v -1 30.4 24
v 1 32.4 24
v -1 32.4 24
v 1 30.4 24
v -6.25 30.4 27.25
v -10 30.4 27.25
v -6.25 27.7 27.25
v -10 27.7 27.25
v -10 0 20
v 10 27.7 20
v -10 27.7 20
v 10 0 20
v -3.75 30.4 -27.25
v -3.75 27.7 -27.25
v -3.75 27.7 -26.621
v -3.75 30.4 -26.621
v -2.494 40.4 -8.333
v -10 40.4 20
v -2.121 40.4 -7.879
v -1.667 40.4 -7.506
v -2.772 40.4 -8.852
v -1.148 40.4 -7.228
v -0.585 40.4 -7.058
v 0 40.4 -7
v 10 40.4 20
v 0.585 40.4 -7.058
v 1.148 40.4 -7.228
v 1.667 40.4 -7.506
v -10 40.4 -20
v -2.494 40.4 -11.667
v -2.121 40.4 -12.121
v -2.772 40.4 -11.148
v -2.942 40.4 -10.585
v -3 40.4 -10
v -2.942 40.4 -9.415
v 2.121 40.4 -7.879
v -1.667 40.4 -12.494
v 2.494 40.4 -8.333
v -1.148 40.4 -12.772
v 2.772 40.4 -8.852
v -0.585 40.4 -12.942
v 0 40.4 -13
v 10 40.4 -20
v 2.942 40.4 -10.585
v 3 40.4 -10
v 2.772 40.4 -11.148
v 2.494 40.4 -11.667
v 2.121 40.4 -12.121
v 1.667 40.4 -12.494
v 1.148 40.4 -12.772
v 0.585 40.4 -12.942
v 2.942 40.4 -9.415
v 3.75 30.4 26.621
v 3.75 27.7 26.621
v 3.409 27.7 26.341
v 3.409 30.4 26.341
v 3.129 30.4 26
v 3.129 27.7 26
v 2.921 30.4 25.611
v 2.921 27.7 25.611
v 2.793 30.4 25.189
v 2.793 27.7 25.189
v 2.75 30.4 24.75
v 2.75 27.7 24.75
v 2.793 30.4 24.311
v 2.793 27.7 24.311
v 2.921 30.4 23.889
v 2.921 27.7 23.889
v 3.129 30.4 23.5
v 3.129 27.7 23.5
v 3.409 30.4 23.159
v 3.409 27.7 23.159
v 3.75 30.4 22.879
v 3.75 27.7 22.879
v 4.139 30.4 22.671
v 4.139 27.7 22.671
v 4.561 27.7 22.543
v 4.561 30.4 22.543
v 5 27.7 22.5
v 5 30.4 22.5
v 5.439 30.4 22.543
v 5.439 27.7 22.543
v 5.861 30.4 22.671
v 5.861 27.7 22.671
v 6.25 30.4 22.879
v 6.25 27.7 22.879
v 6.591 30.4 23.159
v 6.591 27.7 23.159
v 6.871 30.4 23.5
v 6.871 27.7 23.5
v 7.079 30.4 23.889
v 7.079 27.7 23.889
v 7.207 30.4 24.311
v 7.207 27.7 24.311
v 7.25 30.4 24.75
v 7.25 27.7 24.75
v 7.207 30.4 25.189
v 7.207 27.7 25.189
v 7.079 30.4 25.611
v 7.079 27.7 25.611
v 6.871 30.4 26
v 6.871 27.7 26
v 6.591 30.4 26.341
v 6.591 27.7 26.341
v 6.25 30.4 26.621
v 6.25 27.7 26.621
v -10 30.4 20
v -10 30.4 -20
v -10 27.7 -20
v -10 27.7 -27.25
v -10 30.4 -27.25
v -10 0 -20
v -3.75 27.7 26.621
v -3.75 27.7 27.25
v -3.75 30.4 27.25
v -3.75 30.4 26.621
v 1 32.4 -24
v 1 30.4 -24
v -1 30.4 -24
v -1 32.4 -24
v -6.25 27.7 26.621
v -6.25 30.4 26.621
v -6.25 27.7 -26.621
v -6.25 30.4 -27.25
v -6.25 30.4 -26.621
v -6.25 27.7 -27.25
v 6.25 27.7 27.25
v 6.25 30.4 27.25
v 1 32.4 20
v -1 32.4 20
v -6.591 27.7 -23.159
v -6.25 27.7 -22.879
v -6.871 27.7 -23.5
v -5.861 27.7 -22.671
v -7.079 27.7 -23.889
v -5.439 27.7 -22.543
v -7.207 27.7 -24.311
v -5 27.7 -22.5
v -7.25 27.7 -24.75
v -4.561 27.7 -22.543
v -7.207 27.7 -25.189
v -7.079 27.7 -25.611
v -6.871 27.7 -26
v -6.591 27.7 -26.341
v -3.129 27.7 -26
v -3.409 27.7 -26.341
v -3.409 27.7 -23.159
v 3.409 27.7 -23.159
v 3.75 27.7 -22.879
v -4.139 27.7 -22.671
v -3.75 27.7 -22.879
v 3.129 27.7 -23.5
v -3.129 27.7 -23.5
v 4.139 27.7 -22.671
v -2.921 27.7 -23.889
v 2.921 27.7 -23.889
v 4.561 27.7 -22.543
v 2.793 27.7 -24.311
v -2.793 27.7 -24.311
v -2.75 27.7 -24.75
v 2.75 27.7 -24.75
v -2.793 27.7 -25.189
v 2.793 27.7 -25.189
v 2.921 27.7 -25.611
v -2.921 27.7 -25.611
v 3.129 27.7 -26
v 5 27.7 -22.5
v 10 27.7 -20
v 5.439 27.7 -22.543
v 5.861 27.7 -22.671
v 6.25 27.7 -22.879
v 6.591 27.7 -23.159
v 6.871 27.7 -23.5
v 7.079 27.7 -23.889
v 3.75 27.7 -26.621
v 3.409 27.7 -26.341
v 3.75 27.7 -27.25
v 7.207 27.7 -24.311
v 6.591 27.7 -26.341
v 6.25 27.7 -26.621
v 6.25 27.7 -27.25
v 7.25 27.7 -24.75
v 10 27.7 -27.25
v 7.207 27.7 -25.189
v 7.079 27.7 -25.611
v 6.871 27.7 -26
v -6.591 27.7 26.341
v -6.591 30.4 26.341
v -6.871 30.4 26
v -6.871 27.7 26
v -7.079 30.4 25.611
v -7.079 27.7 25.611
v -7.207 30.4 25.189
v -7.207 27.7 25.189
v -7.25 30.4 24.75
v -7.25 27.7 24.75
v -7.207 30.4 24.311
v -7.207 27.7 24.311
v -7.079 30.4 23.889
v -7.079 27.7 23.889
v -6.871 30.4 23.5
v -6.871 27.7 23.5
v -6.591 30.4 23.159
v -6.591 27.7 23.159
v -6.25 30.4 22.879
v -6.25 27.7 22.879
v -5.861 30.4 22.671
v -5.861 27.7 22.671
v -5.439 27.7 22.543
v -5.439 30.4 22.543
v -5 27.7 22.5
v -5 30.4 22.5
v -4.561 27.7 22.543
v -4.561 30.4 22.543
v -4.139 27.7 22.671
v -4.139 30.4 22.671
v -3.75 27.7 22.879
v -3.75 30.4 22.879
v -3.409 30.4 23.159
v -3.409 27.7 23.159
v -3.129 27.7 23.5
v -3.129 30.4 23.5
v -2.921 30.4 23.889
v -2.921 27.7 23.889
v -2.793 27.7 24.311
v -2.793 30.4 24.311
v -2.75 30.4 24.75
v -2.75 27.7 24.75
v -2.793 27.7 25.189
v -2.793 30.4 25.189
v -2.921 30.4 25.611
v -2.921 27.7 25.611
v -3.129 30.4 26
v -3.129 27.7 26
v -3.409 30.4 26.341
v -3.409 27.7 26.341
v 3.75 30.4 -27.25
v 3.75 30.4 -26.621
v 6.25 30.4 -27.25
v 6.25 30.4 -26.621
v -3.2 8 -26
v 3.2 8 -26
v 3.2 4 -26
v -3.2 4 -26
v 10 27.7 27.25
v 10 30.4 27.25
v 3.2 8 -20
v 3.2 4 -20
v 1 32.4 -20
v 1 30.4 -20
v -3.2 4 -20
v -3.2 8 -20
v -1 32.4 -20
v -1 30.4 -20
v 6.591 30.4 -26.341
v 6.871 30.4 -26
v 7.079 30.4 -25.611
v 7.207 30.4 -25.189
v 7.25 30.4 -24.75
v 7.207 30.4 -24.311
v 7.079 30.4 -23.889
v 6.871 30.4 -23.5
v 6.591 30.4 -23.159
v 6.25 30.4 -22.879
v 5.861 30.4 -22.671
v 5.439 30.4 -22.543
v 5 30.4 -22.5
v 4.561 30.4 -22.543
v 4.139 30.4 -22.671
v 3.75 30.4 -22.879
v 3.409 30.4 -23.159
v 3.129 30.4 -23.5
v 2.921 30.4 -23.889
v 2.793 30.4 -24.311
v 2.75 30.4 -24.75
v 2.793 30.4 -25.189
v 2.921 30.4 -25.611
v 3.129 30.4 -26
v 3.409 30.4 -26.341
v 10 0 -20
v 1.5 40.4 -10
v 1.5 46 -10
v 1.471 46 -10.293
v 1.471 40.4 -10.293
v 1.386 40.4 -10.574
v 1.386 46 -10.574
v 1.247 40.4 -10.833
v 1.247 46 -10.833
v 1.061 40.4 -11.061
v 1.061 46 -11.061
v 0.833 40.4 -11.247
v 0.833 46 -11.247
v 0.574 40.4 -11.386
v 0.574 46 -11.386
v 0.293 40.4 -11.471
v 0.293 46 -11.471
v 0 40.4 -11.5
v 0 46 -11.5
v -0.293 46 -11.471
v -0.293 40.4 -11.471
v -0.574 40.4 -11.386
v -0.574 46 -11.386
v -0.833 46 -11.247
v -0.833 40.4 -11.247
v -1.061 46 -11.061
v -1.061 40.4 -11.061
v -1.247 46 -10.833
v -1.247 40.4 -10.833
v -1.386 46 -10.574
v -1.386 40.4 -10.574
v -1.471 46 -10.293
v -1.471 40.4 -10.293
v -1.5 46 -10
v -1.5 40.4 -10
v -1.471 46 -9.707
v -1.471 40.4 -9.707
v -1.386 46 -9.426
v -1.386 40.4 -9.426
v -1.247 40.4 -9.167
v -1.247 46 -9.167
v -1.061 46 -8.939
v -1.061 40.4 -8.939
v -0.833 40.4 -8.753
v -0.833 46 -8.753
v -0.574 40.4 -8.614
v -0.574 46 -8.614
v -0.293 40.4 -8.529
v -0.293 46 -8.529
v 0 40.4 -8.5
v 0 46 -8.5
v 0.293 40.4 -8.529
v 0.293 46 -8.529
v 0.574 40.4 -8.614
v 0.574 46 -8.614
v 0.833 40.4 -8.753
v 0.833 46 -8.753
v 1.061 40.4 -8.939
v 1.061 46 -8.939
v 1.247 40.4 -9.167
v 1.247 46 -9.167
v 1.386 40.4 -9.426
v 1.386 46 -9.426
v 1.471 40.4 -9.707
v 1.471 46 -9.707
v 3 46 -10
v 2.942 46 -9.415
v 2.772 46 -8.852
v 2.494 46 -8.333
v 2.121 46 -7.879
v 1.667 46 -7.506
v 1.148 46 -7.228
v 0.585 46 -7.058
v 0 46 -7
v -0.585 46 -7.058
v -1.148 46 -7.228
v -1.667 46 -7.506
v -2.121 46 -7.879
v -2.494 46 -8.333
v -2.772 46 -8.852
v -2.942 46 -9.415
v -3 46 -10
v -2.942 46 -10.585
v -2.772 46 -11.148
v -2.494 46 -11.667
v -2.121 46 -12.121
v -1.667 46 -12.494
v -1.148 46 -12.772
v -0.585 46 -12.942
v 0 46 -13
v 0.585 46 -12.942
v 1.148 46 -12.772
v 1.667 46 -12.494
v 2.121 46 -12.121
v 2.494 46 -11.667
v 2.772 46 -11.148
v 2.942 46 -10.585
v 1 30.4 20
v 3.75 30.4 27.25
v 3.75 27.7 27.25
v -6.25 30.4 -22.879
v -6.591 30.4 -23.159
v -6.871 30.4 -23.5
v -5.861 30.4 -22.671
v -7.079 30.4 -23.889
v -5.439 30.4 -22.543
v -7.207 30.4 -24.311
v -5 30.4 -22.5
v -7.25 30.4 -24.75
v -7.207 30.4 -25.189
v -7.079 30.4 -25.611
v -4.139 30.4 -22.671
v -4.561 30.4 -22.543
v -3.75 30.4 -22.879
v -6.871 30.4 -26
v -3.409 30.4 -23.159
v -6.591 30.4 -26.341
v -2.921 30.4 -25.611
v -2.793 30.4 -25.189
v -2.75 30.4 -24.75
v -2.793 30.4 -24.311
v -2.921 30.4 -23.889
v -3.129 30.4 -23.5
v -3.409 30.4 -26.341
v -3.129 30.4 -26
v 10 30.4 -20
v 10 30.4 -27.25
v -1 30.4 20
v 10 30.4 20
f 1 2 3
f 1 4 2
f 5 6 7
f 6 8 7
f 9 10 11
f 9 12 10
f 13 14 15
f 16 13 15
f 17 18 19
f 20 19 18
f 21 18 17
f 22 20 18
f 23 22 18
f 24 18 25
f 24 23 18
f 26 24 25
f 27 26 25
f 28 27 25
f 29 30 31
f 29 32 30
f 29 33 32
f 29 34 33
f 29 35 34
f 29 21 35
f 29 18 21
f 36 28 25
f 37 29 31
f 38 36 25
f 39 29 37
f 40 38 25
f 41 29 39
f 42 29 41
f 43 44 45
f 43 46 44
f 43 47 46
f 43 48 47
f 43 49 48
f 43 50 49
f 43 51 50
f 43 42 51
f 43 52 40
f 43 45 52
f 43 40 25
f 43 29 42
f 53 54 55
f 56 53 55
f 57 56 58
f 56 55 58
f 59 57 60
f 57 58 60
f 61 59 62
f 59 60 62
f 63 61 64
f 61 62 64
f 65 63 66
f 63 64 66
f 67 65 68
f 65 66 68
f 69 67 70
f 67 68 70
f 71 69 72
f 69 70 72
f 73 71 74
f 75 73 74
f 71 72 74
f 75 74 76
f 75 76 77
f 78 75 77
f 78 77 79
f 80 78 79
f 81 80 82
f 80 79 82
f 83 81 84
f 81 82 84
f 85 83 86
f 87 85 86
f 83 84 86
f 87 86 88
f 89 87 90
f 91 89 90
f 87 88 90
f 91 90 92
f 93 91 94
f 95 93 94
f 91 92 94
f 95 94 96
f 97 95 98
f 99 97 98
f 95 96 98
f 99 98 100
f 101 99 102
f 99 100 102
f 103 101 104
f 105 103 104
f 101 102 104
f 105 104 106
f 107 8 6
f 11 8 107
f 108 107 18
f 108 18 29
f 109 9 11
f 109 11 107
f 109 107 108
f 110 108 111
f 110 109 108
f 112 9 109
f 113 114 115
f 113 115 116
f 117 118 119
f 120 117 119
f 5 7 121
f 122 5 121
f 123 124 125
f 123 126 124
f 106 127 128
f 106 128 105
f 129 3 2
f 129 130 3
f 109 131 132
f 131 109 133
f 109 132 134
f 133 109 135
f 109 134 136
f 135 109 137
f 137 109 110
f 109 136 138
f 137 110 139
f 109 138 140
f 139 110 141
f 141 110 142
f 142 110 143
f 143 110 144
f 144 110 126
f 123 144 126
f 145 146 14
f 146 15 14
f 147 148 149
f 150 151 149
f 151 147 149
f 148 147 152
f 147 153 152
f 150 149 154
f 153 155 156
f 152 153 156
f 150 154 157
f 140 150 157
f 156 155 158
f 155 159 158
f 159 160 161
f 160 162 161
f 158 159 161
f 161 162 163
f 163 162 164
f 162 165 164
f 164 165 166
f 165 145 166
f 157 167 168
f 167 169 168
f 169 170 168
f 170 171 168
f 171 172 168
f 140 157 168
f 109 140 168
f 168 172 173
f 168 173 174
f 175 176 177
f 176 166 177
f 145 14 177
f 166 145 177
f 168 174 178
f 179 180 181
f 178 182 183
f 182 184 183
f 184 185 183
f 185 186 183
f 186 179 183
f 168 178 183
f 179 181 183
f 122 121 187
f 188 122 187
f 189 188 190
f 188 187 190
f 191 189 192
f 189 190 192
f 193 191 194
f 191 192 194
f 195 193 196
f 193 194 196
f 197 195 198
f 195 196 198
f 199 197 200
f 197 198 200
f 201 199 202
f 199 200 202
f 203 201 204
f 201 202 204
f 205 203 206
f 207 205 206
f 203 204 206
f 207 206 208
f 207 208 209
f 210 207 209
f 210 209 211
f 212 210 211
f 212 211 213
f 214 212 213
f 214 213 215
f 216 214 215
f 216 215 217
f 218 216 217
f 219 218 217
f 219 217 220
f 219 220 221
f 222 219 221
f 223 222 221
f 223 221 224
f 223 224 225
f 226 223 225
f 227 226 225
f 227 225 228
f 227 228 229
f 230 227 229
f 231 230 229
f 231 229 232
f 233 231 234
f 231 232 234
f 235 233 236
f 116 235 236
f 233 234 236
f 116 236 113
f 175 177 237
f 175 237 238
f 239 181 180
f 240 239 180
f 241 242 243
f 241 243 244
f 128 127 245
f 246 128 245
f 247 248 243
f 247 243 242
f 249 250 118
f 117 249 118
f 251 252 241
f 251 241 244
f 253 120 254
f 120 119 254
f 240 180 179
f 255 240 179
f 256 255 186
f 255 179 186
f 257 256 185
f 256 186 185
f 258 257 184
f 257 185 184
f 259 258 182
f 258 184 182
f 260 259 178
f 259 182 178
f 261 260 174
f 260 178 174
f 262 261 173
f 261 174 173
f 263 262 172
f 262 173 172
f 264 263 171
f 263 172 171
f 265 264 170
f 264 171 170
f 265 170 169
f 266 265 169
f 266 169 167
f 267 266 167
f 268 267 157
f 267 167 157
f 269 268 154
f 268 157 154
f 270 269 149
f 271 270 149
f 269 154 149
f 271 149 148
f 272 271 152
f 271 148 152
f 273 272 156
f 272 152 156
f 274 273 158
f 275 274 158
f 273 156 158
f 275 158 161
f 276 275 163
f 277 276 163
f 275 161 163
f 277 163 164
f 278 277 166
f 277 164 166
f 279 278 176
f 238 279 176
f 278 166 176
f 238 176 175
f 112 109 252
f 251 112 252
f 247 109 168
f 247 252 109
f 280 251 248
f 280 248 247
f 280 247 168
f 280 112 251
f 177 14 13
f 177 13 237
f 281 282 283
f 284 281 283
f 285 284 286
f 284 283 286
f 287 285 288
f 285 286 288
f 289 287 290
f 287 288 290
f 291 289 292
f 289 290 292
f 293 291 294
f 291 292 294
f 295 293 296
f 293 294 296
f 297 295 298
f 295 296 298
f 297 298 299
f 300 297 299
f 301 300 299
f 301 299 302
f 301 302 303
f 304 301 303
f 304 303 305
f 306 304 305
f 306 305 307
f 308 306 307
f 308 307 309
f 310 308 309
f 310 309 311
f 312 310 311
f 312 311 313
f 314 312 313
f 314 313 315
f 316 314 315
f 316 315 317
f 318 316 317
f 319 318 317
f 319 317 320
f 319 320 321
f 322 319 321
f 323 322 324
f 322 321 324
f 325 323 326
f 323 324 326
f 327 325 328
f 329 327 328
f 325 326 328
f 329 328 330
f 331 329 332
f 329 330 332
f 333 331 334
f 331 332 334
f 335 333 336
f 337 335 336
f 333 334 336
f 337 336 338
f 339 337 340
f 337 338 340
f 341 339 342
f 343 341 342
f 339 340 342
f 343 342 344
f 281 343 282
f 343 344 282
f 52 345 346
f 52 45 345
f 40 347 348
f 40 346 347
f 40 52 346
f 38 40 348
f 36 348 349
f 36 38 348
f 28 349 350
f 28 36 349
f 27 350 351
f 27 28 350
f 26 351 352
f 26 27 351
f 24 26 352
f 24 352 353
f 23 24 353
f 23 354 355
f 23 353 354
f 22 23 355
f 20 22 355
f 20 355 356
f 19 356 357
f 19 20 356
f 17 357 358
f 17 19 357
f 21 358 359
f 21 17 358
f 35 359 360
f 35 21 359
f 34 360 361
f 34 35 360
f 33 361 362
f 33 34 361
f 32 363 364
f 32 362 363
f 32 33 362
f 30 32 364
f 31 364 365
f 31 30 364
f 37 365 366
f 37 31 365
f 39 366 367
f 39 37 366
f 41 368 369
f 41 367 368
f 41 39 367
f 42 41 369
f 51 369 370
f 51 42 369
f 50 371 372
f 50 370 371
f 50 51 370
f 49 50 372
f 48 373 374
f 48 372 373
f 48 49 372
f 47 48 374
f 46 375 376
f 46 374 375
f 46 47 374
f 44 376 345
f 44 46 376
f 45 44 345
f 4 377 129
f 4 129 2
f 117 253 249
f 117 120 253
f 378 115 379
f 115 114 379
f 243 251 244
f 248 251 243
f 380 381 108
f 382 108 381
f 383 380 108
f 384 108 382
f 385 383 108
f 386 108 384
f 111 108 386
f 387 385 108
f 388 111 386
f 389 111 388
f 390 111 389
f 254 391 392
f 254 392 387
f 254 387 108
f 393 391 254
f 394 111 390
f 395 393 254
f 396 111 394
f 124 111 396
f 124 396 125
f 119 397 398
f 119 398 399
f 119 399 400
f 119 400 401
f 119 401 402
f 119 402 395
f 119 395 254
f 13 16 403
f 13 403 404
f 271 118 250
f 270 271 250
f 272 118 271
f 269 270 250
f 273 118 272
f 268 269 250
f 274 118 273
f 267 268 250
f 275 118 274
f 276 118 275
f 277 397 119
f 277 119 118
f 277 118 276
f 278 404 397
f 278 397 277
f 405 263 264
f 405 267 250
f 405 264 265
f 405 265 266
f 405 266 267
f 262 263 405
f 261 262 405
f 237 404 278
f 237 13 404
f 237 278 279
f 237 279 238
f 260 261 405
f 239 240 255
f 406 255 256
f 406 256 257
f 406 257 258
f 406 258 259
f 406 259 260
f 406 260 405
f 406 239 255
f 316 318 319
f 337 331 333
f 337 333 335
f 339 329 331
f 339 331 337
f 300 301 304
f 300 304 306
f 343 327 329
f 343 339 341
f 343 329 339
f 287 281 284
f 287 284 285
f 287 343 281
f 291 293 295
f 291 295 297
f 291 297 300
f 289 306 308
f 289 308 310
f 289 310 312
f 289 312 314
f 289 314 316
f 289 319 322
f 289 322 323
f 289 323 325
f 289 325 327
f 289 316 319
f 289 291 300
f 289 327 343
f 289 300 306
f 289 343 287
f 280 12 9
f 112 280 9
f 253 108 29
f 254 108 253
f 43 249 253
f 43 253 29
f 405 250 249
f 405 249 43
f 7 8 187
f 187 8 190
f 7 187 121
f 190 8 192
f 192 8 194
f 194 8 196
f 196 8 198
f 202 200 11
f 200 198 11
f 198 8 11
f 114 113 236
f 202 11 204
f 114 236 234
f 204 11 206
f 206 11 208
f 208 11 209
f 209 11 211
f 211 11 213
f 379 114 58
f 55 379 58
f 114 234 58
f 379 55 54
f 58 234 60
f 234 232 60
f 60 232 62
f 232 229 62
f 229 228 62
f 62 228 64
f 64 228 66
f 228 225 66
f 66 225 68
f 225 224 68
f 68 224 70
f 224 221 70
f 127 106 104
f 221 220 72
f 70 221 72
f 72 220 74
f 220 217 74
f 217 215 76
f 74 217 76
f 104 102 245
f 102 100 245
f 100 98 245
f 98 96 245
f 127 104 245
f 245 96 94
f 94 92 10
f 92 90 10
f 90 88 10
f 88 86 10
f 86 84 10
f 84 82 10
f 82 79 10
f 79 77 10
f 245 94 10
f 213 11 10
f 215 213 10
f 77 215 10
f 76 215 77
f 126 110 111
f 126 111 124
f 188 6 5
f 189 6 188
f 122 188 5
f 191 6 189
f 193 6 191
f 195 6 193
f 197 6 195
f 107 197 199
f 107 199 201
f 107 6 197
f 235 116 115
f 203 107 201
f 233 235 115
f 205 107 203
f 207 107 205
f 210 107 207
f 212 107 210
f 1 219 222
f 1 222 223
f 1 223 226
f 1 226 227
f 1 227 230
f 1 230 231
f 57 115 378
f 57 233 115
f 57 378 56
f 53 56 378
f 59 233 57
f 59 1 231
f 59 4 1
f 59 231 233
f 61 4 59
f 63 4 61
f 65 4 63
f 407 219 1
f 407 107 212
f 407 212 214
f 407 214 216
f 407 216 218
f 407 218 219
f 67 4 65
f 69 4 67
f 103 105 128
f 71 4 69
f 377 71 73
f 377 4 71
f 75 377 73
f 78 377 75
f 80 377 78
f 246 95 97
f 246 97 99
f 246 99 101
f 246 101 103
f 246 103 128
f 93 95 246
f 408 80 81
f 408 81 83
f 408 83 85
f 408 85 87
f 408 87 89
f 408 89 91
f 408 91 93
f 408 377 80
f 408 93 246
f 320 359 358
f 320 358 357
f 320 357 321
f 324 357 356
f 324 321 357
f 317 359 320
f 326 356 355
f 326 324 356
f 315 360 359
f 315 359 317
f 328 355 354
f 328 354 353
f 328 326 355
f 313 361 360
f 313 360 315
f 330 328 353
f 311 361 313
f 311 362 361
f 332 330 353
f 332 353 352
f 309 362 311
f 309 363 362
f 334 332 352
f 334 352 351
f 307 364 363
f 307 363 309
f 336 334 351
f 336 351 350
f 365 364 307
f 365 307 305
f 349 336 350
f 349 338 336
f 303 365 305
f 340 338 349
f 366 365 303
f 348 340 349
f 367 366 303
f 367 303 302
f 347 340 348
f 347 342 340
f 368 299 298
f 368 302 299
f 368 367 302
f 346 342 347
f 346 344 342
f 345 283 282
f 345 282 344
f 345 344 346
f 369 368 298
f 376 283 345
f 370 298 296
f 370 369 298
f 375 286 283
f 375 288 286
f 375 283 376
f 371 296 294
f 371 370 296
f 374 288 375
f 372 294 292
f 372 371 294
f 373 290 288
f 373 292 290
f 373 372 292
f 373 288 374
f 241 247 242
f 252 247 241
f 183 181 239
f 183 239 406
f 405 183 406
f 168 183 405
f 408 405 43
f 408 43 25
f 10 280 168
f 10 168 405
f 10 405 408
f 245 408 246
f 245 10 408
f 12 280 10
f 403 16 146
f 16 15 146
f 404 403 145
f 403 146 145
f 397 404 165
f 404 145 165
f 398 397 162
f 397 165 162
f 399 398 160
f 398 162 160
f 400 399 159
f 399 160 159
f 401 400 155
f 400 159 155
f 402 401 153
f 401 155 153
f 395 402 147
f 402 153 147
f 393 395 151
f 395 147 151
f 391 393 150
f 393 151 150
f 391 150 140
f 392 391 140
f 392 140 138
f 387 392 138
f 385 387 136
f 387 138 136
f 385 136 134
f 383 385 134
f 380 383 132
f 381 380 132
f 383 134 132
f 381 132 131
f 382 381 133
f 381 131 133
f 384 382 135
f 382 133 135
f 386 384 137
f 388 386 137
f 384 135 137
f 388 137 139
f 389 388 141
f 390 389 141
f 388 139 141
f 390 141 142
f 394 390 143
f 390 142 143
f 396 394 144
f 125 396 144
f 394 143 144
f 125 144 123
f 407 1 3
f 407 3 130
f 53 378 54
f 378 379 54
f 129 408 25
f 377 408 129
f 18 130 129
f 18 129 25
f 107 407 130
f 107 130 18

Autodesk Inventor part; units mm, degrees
ref_plane "YZ Plane" through (0, 0, 0) normal (1, 0, 0) x (0, 1, 0)
ref_plane "XZ Plane" through (0, 0, 0) normal (0, 1, 0) x (-1, 0, 0)
sketch "Sketch1" plane through (0, 0, 0) normal (0, 1, 0) x (-1, 0, 0)
  line L0 (-10, 20) -> (10, 20)
  line L1 (10, 20) -> (10, -20)
  line L2 (10, -20) -> (-10, -20)
  line L3 (-10, -20) -> (-10, 20)
  line L4 (-10, 20) -> (10, -20) construction
  line L5 (10, 20) -> (-10, -20) construction
  point P0 (0, 0)
  dimension "d0" = 20
  dimension "d1" = 40
extrude "Extrusion1" add sketch "Sketch1" along normal blind 27.7
ref_plane "Work Plane1" through (0, 27.7, 0) normal (0, 1, 0) x (1, 0, 0)
sketch "Sketch2" plane through (0, 27.7, 0) normal (0, 1, 0) x (1, 0, 0)
  line L0 (-10, 20) -> (-10, -20) projected
  line L1 (-10, -20) -> (10, -20) projected
  line L2 (10, -20) -> (10, 20) projected
  line L3 (10, 20) -> (-10, 20) projected
  point P0 (0, 0)
extrude "Extrusion2" add sketch "Sketch2" along normal blind 12.7
sketch "Sketch3" plane through (0, 27.7, 0) normal (0, 1, 0) x (1, 0, 0)
  line L0 (10, -20) -> (10, 20) projected
  line L1 (10, 20) -> (-10, 20) projected
  line L2 (-10, 20) -> (-10, -20) projected
  line L3 (-10, -20) -> (10, -20) projected
  line L4 (10, -20) -> (-10, -20)
  line L5 (-10, -20) -> (-10, -27.25)
  line L6 (-10, -27.25) -> (10, -27.25)
  line L7 (10, -27.25) -> (10, -20)
  line L8 (10, 20) -> (-10, 20)
  line L9 (-10, 20) -> (-10, 27.25)
  line L10 (-10, 27.25) -> (10, 27.25)
  line L11 (10, 27.25) -> (10, 20)
  circle A0 centre (-5, -24.75) radius 2.25
  line L12 (-14, 0) -> (14, 0) projected
  line L13 (0, 38.15) -> (0, -38.15) projected
  circle A1 centre (-5, 24.75) radius 2.25
  circle A2 centre (5, -24.75) radius 2.25
  circle A3 centre (5, 24.75) radius 2.25
  line L14 (-6.25, -27.25) -> (-6.25, -26.6208)
  line L15 (-5, -27.25) -> (-5, -27)
  line L16 (-3.75, -27.25) -> (-3.75, -26.6208)
  line L17 (-6.25, 27.25) -> (-6.25, 26.6208)
  line L18 (-3.75, 27.25) -> (-3.75, 26.6208)
  line L19 (6.25, -27.25) -> (6.25, -26.6208)
  line L20 (3.75, -27.25) -> (3.75, -26.6208)
  line L21 (6.25, 27.25) -> (6.25, 26.6208)
  line L22 (3.75, 27.25) -> (3.75, 26.6208)
  point P0 (0, 0)
  point P1 (5.7141, 27.25)
  point P2 (4.2859, 27.25)
  point P3 (-4.2859, 27.25)
  point P4 (-5.7141, 27.25)
  point P5 (-5.7141, -27.25)
  point P6 (-4.2859, -27.25)
  point P7 (4.2859, -27.25)
  point P8 (5.7141, -27.25)
  point P9 (3.75, -26.6208)
  point P10 (6.25, 26.6208)
  point P11 (-6.25, 26.6208)
  dimension "d7" = 54.5
  dimension "d8" = 10
  dimension "d9" = 49.5
  dimension "d10" = 4.5
  dimension "d13" = 2.5
extrude "Extrusion3" add sketch "Sketch3" along normal blind 2.7 contours L7 L6 L19 A2 L20 L13 L3 | L13 L6 L16 A0 L14 L5 L3 | L1 L13 L10 L22 A3 L21 L11 | L1 L9 L10 L17 A1 L18 L13
sketch "Sketch4" plane through (0, 30.4, 0) normal (0, 1, 0) x (1, 0, 0)
  line L0 (-10, -20) -> (10, -20) projected
  line L1 (1, -24) -> (-1, -24)
  line L2 (-1, -24) -> (-1, -20)
  line L3 (-1, -20) -> (1, -20)
  line L4 (1, -20) -> (1, -24)
  line L5 (1, -24) -> (-1, -20) construction
  line L6 (-1, -24) -> (1, -20) construction
  line L7 (0, 38.15) -> (0, -38.15) projected
  line L8 (-14, 0) -> (14, 0) projected
  line L9 (1, 24) -> (-1, 24)
  line L10 (-1, 24) -> (-1, 20)
  line L11 (1, 20) -> (1, 24)
  line L12 (-1, 20) -> (1, 20)
  line L13 (10, 20) -> (-10, 20) projected
  point P0 (0, 0)
  point P1 (0, -22)
  point P2 (0, -22)
  point P3 (1, -20)
  dimension "d14" = 2
  dimension "d15" = 4
extrude "Extrusion4" add sketch "Sketch4" along normal blind 2
sketch "Sketch5" plane through (0, 40.4, 0) normal (0, 1, 0) x (1, 0, 0)
  circle A0 centre (0, 10) radius 3
  line L0 (10, -20) -> (10, 20) projected
  line L1 (10, 20) -> (-10, 20) projected
  line L2 (-10, 20) -> (-10, -20) projected
  line L3 (-10, -20) -> (10, -20) projected
  point P0 (0, 0)
  dimension "d18" = 6
  dimension "d19" = 30
extrude "Extrusion5" add sketch "Sketch5" along normal blind 5.6 contours A0
sketch "Sketch6" plane through (0, 46, -10) normal (0, 1, 0) x (1, 0, 0)
  circle A0 centre (0, 0) radius 3 projected
  circle A1 centre (0, 0) radius 1.5
  point P0 (0, -10)
  dimension "d22" = 3
extrude "Extrusion6" cut sketch "Sketch6" against normal up to surface (5.6 mm away) contours A1
sketch "Sketch7" plane through (10, 0, -20) normal (0, 0, -1) x (-1, 0, 0)
  line L0 (6.8, 8) -> (13.2, 8)
  line L1 (13.2, 8) -> (13.2, 4)
  line L2 (13.2, 4) -> (6.8, 4)
  line L3 (6.8, 4) -> (6.8, 8)
  line L4 (6.8, 8) -> (13.2, 4) construction
  line L5 (13.2, 8) -> (6.8, 4) construction
  line L6 (0, 0) -> (20, 0) projected
  line L7 (10, 0) -> (10, 6)
  dimension "d25" = 6.4
  dimension "d26" = 4
  dimension "d27" = 8
extrude "Extrusion7" add sketch "Sketch7" along normal blind 6
properties part number "Servo"
